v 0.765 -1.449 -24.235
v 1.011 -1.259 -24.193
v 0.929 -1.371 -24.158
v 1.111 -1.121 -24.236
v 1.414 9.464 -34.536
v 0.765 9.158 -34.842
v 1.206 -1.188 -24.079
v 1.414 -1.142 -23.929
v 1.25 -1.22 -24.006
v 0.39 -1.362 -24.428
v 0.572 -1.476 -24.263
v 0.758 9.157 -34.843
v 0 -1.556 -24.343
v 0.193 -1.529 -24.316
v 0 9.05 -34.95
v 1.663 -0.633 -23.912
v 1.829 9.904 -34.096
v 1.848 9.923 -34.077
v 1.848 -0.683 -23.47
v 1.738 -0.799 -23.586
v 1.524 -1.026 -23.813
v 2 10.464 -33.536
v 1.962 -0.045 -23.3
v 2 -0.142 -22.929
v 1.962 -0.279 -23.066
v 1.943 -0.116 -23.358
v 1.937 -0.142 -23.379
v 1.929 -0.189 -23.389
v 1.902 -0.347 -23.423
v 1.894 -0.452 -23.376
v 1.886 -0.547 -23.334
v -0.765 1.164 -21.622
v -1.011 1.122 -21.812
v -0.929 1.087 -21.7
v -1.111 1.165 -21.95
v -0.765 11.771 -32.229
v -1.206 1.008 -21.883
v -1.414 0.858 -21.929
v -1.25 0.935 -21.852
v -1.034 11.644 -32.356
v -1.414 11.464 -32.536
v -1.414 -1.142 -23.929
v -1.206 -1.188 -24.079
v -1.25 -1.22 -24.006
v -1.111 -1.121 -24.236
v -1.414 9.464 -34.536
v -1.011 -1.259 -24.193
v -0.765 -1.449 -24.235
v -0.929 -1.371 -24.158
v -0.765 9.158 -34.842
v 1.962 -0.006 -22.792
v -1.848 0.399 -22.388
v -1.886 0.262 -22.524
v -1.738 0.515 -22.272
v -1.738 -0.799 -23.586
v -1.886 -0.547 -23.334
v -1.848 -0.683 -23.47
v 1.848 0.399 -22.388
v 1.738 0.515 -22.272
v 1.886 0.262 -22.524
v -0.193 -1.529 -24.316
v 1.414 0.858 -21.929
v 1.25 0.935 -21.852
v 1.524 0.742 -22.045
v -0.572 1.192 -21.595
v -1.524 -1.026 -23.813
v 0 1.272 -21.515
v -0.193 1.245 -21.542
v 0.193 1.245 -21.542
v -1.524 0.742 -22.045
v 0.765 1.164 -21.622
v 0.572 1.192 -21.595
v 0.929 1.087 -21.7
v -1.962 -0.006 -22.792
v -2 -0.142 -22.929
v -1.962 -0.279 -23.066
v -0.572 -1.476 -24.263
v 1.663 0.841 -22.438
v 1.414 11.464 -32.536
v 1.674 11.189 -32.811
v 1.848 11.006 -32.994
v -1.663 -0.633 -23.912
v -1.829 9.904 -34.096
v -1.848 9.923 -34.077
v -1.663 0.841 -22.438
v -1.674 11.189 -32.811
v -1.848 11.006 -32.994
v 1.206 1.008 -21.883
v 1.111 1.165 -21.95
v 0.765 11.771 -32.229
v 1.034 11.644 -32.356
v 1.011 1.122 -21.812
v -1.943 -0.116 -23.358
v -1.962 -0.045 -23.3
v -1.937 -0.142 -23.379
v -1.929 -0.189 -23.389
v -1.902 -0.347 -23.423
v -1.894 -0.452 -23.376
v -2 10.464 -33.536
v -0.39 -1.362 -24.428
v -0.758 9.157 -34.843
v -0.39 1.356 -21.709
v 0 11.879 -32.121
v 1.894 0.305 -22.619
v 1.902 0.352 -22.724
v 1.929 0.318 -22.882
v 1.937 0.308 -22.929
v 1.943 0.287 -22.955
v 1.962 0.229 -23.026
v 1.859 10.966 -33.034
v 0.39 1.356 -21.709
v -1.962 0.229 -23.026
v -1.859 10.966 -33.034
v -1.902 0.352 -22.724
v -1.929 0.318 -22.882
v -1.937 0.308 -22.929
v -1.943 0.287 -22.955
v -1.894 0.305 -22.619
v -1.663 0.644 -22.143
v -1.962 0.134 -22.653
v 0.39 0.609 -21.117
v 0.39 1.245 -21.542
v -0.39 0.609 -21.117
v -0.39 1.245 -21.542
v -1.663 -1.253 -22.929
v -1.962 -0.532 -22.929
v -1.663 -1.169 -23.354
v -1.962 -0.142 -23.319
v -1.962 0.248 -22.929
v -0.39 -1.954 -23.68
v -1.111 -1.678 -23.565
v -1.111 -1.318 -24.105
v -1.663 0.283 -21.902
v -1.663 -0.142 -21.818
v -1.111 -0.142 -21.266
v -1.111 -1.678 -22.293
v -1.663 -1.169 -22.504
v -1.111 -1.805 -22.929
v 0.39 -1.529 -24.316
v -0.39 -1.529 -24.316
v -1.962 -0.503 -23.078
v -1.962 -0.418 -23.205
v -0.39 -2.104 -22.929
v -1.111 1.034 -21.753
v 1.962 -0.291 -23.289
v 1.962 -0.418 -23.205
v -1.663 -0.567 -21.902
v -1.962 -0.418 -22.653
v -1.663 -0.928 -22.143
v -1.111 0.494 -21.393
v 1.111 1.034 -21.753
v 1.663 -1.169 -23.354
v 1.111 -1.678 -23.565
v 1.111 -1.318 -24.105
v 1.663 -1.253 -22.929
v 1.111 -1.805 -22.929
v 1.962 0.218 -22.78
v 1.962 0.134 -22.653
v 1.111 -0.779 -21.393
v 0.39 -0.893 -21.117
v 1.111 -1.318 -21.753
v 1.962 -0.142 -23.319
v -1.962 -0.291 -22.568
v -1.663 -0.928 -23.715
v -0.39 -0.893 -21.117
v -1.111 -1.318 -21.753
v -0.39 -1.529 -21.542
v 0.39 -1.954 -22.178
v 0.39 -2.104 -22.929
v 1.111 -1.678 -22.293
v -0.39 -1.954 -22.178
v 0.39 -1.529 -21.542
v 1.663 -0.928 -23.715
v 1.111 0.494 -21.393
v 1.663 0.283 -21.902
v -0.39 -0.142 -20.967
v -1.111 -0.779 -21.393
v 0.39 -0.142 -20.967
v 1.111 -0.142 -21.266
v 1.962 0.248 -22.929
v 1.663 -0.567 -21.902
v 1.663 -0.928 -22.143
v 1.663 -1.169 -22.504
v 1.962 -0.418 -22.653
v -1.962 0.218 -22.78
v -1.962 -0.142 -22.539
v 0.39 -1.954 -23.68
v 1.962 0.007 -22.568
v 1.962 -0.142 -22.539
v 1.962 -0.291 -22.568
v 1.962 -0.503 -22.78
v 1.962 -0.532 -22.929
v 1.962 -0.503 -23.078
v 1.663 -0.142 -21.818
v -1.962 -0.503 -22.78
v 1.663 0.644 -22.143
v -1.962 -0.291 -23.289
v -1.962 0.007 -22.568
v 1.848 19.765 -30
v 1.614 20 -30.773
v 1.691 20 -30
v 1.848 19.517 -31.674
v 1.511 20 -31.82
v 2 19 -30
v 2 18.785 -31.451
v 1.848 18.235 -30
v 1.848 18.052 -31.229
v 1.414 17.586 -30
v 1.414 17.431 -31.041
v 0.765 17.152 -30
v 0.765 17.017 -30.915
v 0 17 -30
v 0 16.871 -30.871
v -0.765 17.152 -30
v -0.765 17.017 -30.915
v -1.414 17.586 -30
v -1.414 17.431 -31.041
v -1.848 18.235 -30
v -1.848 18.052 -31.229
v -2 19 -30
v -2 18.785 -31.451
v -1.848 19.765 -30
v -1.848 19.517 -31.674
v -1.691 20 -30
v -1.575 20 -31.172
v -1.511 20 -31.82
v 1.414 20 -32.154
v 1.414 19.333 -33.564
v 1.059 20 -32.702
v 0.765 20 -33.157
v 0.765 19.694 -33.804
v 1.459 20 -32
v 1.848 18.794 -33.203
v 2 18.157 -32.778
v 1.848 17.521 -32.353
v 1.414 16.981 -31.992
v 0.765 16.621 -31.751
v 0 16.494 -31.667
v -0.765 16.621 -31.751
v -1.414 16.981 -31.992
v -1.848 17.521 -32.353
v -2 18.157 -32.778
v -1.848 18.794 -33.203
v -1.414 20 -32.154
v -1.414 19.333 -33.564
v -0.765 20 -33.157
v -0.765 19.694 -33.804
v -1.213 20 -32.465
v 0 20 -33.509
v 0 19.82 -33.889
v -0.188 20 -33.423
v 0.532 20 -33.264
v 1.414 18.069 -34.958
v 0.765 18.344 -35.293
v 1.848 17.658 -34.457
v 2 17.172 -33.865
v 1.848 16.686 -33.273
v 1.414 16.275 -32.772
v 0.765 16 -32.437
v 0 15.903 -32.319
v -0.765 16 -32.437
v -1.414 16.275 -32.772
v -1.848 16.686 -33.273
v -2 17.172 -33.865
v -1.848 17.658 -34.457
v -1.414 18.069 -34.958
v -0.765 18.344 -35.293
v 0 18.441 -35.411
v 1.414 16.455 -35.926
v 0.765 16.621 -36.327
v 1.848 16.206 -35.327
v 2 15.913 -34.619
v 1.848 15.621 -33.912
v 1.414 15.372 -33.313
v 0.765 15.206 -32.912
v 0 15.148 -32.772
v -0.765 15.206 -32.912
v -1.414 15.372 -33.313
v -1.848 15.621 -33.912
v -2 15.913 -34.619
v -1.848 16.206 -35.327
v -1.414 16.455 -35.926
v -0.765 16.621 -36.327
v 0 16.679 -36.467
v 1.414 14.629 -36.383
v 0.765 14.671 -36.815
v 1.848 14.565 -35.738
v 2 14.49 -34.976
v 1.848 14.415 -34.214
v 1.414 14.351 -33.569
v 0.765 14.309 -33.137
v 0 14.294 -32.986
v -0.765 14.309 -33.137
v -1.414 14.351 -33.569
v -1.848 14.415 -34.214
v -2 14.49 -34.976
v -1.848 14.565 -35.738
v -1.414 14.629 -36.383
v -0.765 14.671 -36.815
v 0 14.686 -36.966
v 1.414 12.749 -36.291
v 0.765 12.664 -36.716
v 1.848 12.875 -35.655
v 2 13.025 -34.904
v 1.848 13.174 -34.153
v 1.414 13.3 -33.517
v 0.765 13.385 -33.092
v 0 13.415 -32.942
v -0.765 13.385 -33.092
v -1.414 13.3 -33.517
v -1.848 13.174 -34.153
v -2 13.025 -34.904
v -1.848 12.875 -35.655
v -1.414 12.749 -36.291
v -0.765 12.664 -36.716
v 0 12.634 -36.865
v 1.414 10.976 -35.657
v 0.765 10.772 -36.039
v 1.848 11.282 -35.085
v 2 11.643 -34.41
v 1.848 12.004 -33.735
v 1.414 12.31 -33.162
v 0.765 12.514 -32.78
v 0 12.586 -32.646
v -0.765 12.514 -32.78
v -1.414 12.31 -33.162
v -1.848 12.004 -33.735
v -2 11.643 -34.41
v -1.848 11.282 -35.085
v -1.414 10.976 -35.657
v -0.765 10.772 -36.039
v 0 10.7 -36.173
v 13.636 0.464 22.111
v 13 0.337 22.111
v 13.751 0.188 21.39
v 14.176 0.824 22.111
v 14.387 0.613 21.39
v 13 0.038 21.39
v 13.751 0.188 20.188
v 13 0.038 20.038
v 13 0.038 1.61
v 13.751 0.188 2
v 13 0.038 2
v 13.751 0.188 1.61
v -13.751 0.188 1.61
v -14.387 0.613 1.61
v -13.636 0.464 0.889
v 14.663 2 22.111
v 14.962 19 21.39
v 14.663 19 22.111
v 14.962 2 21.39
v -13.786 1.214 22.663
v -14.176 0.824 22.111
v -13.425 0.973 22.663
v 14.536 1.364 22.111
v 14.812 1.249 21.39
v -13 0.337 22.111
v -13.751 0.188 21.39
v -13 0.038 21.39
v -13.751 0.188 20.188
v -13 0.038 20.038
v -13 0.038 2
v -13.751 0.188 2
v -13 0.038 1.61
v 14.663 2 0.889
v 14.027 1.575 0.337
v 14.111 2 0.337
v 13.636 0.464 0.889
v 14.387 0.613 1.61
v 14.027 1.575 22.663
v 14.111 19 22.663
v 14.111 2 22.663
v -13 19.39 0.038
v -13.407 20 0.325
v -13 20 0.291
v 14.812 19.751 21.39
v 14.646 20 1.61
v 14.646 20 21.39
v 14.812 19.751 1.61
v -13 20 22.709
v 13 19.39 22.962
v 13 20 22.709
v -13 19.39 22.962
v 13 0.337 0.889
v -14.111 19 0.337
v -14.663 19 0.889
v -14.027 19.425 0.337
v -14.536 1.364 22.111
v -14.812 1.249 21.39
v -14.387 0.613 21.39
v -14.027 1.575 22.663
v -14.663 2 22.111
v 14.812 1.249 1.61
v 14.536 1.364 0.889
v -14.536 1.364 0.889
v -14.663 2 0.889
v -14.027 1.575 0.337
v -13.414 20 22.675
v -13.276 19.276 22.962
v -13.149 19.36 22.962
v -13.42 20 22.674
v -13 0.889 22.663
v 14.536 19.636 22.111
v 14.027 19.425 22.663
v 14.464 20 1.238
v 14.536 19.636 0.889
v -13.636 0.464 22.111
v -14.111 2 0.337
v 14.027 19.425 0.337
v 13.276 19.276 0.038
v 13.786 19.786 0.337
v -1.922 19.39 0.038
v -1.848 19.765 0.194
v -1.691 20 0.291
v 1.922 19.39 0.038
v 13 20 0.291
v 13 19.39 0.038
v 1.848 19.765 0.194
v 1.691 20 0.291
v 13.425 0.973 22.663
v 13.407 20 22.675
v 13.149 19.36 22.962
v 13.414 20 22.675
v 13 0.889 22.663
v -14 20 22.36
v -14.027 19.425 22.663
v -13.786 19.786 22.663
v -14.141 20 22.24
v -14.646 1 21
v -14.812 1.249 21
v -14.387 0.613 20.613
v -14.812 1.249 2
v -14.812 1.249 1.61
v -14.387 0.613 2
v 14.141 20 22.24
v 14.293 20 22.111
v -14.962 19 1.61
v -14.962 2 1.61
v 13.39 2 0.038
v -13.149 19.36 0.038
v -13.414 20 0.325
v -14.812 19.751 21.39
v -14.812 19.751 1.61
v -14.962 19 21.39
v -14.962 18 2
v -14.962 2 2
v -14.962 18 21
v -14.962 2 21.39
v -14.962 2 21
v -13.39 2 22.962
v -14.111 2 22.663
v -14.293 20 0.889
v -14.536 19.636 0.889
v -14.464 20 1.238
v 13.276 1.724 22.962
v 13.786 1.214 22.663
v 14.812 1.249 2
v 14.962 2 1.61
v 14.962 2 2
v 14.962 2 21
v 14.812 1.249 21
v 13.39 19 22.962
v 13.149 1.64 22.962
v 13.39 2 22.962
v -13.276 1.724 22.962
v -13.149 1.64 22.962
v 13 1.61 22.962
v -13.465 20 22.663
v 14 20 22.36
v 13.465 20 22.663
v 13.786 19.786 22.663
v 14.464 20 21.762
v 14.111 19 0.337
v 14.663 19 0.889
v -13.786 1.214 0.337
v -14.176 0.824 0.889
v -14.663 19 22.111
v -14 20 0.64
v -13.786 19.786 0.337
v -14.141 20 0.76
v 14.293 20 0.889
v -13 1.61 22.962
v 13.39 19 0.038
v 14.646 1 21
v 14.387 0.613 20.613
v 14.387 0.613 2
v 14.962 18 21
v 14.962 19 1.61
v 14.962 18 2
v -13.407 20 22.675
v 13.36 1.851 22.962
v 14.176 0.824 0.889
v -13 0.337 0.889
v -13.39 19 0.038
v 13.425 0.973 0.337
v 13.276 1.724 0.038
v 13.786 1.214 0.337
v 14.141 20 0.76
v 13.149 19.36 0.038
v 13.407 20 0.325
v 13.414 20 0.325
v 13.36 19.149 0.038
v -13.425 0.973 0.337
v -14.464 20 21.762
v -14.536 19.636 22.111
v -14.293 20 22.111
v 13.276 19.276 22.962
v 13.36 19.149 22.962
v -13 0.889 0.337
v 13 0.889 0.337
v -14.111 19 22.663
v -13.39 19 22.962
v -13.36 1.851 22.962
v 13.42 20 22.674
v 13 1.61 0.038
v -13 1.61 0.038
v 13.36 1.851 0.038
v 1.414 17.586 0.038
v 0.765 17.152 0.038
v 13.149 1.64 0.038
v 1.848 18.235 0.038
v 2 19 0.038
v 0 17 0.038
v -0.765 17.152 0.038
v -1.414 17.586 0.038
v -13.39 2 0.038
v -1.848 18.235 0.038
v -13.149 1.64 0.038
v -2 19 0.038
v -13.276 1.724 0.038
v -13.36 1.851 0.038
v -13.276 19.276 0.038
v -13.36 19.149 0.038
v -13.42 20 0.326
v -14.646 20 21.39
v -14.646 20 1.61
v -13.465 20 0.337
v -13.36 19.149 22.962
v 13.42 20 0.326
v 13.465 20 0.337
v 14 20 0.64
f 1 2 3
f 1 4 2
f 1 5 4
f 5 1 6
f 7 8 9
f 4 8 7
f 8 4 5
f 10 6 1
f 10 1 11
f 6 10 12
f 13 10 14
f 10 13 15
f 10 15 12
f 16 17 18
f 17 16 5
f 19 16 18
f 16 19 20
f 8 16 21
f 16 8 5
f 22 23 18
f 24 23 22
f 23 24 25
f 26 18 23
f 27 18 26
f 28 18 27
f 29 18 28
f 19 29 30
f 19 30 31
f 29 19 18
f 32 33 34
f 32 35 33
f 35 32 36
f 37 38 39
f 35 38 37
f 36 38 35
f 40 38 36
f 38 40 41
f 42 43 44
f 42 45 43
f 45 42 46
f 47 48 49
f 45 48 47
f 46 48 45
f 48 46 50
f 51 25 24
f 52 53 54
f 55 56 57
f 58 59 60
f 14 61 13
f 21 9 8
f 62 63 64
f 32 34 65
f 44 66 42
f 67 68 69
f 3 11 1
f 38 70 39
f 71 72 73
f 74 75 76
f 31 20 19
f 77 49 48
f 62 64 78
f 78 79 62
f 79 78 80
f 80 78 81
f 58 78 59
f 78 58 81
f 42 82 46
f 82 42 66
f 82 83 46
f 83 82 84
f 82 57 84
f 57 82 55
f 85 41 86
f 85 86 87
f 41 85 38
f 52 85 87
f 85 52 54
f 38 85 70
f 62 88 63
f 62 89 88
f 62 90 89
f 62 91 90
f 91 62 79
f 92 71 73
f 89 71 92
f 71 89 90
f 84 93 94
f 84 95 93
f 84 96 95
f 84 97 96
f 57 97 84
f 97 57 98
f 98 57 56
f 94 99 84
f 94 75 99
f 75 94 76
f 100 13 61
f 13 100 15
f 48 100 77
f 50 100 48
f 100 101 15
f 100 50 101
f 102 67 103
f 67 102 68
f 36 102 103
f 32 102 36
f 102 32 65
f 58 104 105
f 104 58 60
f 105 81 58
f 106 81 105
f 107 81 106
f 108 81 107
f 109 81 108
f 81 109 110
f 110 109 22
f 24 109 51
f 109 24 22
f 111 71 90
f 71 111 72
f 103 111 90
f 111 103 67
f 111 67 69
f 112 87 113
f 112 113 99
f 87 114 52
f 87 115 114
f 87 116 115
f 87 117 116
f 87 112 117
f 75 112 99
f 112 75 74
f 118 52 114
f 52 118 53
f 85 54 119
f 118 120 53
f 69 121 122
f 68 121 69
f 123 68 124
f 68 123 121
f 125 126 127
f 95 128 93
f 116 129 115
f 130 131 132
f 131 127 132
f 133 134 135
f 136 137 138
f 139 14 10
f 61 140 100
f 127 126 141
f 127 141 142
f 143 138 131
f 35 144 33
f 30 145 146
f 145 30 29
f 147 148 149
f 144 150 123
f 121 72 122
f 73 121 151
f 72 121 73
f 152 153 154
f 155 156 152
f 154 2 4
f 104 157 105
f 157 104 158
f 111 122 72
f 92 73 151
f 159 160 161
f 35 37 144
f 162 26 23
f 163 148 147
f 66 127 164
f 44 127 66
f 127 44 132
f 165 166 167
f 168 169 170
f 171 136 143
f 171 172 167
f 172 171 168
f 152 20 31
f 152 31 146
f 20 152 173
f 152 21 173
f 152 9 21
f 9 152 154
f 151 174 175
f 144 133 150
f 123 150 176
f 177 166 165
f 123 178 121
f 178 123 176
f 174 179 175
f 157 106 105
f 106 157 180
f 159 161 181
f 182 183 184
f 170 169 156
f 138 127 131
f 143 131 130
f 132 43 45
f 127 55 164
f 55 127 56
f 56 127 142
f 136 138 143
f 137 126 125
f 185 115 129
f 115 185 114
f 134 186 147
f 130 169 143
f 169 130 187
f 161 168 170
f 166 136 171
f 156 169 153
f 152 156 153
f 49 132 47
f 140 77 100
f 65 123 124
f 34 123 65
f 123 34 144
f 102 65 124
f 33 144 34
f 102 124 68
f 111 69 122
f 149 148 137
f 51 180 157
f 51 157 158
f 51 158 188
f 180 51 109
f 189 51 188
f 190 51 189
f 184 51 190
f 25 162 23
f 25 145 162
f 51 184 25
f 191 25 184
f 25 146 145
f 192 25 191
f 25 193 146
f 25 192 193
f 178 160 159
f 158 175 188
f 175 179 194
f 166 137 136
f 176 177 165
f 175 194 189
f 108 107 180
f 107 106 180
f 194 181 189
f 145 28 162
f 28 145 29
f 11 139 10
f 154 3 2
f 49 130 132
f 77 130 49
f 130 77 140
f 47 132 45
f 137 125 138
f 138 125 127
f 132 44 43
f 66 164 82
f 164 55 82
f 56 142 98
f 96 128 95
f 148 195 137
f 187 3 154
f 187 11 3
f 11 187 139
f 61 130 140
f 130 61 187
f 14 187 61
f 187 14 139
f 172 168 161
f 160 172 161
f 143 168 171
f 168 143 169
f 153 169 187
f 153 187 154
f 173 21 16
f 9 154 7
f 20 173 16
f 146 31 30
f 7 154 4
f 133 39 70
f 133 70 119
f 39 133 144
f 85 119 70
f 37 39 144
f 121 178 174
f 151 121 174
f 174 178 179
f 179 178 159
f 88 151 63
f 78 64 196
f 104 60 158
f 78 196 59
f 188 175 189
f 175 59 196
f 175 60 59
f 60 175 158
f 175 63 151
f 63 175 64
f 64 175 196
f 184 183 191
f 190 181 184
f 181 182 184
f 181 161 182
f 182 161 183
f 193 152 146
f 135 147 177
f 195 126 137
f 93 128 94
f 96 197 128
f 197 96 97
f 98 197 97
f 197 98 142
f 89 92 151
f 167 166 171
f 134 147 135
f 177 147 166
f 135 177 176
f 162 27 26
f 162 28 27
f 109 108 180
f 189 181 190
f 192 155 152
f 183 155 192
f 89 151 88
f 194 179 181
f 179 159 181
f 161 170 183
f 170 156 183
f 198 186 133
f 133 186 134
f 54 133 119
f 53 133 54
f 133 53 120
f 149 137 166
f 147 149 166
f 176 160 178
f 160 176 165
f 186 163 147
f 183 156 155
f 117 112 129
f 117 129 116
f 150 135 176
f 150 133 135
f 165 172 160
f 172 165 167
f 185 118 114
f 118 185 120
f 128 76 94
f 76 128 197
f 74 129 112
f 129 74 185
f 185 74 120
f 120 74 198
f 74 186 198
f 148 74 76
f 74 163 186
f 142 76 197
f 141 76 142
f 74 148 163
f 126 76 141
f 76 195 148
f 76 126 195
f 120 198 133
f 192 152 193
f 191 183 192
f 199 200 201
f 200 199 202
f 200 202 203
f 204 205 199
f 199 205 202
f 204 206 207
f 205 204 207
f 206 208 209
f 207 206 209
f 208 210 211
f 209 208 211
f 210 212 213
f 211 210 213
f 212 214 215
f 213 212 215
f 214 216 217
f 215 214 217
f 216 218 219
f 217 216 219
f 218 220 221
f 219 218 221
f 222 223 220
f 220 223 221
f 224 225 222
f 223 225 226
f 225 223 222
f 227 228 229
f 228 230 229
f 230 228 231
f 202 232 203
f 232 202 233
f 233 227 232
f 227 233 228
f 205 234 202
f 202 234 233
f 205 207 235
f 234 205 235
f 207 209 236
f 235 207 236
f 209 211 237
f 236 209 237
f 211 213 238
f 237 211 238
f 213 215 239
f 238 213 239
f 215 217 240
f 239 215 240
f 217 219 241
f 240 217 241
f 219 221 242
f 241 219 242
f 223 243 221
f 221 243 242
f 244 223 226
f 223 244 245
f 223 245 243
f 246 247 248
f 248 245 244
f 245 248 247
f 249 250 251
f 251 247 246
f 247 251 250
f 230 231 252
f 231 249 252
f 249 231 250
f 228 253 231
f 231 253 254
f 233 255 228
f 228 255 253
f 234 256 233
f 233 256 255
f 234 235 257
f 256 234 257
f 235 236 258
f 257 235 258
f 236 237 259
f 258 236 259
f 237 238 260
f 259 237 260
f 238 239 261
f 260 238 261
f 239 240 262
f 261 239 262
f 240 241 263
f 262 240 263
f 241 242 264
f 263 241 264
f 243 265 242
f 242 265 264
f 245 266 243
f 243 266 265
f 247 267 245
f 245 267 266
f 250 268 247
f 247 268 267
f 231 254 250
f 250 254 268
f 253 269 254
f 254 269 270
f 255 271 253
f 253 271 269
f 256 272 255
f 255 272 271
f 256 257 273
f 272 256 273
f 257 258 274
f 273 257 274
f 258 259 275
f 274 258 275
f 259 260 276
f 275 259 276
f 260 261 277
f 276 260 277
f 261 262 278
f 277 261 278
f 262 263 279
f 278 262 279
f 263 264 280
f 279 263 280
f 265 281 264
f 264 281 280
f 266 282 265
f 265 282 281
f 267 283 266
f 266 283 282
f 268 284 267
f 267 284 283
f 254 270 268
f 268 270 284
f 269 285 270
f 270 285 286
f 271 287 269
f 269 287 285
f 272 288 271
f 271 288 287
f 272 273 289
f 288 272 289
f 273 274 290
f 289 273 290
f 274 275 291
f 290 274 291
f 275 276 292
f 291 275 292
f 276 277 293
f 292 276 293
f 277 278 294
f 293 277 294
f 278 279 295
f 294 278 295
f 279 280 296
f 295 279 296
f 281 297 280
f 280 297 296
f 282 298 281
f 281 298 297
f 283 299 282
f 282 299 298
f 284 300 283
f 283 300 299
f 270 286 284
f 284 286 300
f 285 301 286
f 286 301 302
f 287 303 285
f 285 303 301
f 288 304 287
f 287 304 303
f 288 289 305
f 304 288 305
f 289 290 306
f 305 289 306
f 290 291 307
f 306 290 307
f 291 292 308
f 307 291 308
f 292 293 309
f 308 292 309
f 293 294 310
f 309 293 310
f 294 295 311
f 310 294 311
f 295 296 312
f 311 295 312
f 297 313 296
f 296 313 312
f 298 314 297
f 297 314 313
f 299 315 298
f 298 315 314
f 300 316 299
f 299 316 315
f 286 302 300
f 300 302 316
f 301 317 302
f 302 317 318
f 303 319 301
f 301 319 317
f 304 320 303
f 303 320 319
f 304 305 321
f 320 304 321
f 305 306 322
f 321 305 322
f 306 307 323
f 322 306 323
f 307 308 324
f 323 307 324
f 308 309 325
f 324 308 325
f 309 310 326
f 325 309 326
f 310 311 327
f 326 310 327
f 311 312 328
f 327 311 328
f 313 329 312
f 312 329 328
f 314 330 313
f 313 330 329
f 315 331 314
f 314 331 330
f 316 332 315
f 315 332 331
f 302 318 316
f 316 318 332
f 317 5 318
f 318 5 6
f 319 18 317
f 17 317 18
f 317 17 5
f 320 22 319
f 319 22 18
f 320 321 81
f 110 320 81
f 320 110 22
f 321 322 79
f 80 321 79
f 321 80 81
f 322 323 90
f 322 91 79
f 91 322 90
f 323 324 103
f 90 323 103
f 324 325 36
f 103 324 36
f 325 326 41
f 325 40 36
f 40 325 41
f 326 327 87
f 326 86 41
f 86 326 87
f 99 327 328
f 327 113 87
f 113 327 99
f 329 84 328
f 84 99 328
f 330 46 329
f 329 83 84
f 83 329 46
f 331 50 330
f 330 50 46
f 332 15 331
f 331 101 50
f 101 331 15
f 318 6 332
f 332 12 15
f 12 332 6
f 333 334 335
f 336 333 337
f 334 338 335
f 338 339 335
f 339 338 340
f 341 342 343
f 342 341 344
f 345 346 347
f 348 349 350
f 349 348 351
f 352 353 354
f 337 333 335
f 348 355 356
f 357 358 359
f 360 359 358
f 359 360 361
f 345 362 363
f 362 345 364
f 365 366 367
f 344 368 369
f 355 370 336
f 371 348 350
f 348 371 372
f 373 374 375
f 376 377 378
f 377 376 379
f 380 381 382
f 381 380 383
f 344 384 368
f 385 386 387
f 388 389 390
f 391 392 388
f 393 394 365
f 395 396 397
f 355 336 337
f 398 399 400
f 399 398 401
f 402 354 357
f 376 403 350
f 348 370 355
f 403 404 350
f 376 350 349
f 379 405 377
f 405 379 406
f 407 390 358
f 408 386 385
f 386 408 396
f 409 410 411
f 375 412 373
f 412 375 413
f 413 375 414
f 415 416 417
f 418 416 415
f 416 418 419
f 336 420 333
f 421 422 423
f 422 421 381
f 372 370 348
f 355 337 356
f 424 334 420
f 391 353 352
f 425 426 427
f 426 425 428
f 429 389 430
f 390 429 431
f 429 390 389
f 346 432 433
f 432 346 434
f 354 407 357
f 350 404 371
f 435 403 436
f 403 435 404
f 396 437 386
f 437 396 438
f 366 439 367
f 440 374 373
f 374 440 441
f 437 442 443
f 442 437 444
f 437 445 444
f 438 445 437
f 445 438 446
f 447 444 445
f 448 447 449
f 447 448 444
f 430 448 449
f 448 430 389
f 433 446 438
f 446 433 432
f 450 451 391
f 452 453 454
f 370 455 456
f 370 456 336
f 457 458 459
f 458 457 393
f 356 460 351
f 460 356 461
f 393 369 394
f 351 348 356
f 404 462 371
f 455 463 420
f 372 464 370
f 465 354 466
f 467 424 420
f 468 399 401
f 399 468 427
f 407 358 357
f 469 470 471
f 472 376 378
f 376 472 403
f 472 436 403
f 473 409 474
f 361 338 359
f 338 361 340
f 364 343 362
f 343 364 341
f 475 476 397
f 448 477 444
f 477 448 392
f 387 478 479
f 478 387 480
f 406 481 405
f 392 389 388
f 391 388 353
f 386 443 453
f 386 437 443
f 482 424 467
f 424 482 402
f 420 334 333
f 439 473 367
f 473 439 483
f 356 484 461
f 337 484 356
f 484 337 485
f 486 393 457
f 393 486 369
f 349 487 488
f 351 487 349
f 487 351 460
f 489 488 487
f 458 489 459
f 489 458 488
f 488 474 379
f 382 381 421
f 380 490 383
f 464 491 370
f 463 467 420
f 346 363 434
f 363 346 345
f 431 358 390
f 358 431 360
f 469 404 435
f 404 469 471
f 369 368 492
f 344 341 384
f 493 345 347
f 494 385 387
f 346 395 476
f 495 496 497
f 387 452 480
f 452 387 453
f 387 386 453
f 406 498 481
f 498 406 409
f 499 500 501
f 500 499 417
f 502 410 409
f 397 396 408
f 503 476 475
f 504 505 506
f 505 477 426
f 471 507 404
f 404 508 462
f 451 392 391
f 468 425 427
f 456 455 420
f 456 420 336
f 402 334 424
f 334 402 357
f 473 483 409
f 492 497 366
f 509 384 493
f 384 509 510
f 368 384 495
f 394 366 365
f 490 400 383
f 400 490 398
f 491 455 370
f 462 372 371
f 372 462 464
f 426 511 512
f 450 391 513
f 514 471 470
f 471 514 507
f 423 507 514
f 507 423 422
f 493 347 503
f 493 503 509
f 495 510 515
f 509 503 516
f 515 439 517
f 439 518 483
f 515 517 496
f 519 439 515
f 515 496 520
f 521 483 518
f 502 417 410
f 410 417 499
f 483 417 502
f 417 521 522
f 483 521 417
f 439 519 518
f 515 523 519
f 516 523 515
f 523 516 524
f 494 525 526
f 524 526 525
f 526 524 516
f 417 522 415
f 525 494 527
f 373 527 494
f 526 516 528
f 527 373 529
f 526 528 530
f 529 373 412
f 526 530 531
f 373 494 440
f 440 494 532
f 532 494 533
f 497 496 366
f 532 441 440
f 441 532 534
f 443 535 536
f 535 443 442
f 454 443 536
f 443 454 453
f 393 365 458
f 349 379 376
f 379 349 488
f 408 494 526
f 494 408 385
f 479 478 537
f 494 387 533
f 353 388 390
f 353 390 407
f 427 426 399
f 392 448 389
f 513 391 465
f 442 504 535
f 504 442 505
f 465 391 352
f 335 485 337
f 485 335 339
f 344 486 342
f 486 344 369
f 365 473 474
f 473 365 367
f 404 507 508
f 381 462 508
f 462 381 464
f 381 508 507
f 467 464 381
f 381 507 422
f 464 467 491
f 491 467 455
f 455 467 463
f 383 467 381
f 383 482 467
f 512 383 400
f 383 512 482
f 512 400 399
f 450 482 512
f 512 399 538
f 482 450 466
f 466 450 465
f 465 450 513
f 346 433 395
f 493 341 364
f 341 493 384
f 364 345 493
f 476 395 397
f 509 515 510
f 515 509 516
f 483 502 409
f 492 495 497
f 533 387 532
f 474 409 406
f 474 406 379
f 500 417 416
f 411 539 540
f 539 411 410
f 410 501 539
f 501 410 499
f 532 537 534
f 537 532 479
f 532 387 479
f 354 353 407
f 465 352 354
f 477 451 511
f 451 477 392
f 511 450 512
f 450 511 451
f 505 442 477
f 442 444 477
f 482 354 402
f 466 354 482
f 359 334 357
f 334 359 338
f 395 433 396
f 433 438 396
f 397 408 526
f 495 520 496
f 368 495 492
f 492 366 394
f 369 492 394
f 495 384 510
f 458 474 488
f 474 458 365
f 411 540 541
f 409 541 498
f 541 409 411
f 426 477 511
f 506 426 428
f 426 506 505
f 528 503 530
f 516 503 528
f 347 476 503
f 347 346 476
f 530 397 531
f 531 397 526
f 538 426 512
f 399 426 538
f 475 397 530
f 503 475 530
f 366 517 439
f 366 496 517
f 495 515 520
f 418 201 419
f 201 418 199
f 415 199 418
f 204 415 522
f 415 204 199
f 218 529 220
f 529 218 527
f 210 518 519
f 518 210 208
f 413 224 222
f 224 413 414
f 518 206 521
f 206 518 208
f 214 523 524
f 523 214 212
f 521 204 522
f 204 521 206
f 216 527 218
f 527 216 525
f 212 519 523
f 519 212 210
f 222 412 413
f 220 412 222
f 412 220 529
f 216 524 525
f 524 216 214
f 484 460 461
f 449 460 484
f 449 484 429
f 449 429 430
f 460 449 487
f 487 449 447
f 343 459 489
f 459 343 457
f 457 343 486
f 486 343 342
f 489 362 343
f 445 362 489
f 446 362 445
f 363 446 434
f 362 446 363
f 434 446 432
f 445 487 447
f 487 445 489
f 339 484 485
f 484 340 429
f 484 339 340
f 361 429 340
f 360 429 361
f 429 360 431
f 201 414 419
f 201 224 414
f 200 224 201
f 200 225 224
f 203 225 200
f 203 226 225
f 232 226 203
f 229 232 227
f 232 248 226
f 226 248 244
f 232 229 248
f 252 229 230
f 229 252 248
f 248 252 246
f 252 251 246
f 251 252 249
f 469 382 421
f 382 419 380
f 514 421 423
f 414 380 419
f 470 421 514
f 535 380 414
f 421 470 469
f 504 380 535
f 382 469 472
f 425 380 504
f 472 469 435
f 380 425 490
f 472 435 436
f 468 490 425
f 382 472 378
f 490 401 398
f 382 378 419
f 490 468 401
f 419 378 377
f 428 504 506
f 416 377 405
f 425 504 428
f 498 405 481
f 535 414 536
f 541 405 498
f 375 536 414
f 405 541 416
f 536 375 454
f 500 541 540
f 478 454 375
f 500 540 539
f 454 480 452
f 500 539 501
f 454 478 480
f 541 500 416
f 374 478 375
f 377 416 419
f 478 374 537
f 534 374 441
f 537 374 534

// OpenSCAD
W = 30;
D = 20;
R = 5;
L = 30;
thick = 2;
deskH = 19;

difference () {
    union () {
        // body
        hull () {
            for (x = [-W / 2 + thick, W / 2 - thick])
                for (y = [thick, D - thick / 2])
                    for (z = [thick, thick + deskH])
                        translate([x, y, z])
                            sphere(r = thick, $fn = 16);
        }
        // hook
        translate([0, D - thick / 2, -L])
            cylinder(r = thick, h = L + thick, $fn = 16);
        translate([0, D - thick / 2 - R, -L]) {
            rotate([-90, 0, 90]) {
                rotate_extrude(angle = 135)
                    translate([R, 0])
                        circle(r = thick, $fn = 16);
                rotate([0, 0, 135]) {
                    translate([R, 0, 0])
                        rotate([-90, 0, 0]) 
                            cylinder(r = thick, h = L / 2, $fn = 16);
                    translate([R, L / 2, 0])
                        sphere(r = thick, $fn = 16);
                }
            }
        }
    }
    // table cutout
    translate([-W / 2, 0, 0])
        rotate([0, 90, 0])
            linear_extrude(W)
                polygon([[-thick, 0], [-thick - deskH + 1, 0], [-thick - deskH, 1],
                         [-thick - deskH, D - thick], [-thick, D - thick]]);
    // flatten rear
    translate([-W / 2, D, -100])
        cube([W, 100, 200]);
}
